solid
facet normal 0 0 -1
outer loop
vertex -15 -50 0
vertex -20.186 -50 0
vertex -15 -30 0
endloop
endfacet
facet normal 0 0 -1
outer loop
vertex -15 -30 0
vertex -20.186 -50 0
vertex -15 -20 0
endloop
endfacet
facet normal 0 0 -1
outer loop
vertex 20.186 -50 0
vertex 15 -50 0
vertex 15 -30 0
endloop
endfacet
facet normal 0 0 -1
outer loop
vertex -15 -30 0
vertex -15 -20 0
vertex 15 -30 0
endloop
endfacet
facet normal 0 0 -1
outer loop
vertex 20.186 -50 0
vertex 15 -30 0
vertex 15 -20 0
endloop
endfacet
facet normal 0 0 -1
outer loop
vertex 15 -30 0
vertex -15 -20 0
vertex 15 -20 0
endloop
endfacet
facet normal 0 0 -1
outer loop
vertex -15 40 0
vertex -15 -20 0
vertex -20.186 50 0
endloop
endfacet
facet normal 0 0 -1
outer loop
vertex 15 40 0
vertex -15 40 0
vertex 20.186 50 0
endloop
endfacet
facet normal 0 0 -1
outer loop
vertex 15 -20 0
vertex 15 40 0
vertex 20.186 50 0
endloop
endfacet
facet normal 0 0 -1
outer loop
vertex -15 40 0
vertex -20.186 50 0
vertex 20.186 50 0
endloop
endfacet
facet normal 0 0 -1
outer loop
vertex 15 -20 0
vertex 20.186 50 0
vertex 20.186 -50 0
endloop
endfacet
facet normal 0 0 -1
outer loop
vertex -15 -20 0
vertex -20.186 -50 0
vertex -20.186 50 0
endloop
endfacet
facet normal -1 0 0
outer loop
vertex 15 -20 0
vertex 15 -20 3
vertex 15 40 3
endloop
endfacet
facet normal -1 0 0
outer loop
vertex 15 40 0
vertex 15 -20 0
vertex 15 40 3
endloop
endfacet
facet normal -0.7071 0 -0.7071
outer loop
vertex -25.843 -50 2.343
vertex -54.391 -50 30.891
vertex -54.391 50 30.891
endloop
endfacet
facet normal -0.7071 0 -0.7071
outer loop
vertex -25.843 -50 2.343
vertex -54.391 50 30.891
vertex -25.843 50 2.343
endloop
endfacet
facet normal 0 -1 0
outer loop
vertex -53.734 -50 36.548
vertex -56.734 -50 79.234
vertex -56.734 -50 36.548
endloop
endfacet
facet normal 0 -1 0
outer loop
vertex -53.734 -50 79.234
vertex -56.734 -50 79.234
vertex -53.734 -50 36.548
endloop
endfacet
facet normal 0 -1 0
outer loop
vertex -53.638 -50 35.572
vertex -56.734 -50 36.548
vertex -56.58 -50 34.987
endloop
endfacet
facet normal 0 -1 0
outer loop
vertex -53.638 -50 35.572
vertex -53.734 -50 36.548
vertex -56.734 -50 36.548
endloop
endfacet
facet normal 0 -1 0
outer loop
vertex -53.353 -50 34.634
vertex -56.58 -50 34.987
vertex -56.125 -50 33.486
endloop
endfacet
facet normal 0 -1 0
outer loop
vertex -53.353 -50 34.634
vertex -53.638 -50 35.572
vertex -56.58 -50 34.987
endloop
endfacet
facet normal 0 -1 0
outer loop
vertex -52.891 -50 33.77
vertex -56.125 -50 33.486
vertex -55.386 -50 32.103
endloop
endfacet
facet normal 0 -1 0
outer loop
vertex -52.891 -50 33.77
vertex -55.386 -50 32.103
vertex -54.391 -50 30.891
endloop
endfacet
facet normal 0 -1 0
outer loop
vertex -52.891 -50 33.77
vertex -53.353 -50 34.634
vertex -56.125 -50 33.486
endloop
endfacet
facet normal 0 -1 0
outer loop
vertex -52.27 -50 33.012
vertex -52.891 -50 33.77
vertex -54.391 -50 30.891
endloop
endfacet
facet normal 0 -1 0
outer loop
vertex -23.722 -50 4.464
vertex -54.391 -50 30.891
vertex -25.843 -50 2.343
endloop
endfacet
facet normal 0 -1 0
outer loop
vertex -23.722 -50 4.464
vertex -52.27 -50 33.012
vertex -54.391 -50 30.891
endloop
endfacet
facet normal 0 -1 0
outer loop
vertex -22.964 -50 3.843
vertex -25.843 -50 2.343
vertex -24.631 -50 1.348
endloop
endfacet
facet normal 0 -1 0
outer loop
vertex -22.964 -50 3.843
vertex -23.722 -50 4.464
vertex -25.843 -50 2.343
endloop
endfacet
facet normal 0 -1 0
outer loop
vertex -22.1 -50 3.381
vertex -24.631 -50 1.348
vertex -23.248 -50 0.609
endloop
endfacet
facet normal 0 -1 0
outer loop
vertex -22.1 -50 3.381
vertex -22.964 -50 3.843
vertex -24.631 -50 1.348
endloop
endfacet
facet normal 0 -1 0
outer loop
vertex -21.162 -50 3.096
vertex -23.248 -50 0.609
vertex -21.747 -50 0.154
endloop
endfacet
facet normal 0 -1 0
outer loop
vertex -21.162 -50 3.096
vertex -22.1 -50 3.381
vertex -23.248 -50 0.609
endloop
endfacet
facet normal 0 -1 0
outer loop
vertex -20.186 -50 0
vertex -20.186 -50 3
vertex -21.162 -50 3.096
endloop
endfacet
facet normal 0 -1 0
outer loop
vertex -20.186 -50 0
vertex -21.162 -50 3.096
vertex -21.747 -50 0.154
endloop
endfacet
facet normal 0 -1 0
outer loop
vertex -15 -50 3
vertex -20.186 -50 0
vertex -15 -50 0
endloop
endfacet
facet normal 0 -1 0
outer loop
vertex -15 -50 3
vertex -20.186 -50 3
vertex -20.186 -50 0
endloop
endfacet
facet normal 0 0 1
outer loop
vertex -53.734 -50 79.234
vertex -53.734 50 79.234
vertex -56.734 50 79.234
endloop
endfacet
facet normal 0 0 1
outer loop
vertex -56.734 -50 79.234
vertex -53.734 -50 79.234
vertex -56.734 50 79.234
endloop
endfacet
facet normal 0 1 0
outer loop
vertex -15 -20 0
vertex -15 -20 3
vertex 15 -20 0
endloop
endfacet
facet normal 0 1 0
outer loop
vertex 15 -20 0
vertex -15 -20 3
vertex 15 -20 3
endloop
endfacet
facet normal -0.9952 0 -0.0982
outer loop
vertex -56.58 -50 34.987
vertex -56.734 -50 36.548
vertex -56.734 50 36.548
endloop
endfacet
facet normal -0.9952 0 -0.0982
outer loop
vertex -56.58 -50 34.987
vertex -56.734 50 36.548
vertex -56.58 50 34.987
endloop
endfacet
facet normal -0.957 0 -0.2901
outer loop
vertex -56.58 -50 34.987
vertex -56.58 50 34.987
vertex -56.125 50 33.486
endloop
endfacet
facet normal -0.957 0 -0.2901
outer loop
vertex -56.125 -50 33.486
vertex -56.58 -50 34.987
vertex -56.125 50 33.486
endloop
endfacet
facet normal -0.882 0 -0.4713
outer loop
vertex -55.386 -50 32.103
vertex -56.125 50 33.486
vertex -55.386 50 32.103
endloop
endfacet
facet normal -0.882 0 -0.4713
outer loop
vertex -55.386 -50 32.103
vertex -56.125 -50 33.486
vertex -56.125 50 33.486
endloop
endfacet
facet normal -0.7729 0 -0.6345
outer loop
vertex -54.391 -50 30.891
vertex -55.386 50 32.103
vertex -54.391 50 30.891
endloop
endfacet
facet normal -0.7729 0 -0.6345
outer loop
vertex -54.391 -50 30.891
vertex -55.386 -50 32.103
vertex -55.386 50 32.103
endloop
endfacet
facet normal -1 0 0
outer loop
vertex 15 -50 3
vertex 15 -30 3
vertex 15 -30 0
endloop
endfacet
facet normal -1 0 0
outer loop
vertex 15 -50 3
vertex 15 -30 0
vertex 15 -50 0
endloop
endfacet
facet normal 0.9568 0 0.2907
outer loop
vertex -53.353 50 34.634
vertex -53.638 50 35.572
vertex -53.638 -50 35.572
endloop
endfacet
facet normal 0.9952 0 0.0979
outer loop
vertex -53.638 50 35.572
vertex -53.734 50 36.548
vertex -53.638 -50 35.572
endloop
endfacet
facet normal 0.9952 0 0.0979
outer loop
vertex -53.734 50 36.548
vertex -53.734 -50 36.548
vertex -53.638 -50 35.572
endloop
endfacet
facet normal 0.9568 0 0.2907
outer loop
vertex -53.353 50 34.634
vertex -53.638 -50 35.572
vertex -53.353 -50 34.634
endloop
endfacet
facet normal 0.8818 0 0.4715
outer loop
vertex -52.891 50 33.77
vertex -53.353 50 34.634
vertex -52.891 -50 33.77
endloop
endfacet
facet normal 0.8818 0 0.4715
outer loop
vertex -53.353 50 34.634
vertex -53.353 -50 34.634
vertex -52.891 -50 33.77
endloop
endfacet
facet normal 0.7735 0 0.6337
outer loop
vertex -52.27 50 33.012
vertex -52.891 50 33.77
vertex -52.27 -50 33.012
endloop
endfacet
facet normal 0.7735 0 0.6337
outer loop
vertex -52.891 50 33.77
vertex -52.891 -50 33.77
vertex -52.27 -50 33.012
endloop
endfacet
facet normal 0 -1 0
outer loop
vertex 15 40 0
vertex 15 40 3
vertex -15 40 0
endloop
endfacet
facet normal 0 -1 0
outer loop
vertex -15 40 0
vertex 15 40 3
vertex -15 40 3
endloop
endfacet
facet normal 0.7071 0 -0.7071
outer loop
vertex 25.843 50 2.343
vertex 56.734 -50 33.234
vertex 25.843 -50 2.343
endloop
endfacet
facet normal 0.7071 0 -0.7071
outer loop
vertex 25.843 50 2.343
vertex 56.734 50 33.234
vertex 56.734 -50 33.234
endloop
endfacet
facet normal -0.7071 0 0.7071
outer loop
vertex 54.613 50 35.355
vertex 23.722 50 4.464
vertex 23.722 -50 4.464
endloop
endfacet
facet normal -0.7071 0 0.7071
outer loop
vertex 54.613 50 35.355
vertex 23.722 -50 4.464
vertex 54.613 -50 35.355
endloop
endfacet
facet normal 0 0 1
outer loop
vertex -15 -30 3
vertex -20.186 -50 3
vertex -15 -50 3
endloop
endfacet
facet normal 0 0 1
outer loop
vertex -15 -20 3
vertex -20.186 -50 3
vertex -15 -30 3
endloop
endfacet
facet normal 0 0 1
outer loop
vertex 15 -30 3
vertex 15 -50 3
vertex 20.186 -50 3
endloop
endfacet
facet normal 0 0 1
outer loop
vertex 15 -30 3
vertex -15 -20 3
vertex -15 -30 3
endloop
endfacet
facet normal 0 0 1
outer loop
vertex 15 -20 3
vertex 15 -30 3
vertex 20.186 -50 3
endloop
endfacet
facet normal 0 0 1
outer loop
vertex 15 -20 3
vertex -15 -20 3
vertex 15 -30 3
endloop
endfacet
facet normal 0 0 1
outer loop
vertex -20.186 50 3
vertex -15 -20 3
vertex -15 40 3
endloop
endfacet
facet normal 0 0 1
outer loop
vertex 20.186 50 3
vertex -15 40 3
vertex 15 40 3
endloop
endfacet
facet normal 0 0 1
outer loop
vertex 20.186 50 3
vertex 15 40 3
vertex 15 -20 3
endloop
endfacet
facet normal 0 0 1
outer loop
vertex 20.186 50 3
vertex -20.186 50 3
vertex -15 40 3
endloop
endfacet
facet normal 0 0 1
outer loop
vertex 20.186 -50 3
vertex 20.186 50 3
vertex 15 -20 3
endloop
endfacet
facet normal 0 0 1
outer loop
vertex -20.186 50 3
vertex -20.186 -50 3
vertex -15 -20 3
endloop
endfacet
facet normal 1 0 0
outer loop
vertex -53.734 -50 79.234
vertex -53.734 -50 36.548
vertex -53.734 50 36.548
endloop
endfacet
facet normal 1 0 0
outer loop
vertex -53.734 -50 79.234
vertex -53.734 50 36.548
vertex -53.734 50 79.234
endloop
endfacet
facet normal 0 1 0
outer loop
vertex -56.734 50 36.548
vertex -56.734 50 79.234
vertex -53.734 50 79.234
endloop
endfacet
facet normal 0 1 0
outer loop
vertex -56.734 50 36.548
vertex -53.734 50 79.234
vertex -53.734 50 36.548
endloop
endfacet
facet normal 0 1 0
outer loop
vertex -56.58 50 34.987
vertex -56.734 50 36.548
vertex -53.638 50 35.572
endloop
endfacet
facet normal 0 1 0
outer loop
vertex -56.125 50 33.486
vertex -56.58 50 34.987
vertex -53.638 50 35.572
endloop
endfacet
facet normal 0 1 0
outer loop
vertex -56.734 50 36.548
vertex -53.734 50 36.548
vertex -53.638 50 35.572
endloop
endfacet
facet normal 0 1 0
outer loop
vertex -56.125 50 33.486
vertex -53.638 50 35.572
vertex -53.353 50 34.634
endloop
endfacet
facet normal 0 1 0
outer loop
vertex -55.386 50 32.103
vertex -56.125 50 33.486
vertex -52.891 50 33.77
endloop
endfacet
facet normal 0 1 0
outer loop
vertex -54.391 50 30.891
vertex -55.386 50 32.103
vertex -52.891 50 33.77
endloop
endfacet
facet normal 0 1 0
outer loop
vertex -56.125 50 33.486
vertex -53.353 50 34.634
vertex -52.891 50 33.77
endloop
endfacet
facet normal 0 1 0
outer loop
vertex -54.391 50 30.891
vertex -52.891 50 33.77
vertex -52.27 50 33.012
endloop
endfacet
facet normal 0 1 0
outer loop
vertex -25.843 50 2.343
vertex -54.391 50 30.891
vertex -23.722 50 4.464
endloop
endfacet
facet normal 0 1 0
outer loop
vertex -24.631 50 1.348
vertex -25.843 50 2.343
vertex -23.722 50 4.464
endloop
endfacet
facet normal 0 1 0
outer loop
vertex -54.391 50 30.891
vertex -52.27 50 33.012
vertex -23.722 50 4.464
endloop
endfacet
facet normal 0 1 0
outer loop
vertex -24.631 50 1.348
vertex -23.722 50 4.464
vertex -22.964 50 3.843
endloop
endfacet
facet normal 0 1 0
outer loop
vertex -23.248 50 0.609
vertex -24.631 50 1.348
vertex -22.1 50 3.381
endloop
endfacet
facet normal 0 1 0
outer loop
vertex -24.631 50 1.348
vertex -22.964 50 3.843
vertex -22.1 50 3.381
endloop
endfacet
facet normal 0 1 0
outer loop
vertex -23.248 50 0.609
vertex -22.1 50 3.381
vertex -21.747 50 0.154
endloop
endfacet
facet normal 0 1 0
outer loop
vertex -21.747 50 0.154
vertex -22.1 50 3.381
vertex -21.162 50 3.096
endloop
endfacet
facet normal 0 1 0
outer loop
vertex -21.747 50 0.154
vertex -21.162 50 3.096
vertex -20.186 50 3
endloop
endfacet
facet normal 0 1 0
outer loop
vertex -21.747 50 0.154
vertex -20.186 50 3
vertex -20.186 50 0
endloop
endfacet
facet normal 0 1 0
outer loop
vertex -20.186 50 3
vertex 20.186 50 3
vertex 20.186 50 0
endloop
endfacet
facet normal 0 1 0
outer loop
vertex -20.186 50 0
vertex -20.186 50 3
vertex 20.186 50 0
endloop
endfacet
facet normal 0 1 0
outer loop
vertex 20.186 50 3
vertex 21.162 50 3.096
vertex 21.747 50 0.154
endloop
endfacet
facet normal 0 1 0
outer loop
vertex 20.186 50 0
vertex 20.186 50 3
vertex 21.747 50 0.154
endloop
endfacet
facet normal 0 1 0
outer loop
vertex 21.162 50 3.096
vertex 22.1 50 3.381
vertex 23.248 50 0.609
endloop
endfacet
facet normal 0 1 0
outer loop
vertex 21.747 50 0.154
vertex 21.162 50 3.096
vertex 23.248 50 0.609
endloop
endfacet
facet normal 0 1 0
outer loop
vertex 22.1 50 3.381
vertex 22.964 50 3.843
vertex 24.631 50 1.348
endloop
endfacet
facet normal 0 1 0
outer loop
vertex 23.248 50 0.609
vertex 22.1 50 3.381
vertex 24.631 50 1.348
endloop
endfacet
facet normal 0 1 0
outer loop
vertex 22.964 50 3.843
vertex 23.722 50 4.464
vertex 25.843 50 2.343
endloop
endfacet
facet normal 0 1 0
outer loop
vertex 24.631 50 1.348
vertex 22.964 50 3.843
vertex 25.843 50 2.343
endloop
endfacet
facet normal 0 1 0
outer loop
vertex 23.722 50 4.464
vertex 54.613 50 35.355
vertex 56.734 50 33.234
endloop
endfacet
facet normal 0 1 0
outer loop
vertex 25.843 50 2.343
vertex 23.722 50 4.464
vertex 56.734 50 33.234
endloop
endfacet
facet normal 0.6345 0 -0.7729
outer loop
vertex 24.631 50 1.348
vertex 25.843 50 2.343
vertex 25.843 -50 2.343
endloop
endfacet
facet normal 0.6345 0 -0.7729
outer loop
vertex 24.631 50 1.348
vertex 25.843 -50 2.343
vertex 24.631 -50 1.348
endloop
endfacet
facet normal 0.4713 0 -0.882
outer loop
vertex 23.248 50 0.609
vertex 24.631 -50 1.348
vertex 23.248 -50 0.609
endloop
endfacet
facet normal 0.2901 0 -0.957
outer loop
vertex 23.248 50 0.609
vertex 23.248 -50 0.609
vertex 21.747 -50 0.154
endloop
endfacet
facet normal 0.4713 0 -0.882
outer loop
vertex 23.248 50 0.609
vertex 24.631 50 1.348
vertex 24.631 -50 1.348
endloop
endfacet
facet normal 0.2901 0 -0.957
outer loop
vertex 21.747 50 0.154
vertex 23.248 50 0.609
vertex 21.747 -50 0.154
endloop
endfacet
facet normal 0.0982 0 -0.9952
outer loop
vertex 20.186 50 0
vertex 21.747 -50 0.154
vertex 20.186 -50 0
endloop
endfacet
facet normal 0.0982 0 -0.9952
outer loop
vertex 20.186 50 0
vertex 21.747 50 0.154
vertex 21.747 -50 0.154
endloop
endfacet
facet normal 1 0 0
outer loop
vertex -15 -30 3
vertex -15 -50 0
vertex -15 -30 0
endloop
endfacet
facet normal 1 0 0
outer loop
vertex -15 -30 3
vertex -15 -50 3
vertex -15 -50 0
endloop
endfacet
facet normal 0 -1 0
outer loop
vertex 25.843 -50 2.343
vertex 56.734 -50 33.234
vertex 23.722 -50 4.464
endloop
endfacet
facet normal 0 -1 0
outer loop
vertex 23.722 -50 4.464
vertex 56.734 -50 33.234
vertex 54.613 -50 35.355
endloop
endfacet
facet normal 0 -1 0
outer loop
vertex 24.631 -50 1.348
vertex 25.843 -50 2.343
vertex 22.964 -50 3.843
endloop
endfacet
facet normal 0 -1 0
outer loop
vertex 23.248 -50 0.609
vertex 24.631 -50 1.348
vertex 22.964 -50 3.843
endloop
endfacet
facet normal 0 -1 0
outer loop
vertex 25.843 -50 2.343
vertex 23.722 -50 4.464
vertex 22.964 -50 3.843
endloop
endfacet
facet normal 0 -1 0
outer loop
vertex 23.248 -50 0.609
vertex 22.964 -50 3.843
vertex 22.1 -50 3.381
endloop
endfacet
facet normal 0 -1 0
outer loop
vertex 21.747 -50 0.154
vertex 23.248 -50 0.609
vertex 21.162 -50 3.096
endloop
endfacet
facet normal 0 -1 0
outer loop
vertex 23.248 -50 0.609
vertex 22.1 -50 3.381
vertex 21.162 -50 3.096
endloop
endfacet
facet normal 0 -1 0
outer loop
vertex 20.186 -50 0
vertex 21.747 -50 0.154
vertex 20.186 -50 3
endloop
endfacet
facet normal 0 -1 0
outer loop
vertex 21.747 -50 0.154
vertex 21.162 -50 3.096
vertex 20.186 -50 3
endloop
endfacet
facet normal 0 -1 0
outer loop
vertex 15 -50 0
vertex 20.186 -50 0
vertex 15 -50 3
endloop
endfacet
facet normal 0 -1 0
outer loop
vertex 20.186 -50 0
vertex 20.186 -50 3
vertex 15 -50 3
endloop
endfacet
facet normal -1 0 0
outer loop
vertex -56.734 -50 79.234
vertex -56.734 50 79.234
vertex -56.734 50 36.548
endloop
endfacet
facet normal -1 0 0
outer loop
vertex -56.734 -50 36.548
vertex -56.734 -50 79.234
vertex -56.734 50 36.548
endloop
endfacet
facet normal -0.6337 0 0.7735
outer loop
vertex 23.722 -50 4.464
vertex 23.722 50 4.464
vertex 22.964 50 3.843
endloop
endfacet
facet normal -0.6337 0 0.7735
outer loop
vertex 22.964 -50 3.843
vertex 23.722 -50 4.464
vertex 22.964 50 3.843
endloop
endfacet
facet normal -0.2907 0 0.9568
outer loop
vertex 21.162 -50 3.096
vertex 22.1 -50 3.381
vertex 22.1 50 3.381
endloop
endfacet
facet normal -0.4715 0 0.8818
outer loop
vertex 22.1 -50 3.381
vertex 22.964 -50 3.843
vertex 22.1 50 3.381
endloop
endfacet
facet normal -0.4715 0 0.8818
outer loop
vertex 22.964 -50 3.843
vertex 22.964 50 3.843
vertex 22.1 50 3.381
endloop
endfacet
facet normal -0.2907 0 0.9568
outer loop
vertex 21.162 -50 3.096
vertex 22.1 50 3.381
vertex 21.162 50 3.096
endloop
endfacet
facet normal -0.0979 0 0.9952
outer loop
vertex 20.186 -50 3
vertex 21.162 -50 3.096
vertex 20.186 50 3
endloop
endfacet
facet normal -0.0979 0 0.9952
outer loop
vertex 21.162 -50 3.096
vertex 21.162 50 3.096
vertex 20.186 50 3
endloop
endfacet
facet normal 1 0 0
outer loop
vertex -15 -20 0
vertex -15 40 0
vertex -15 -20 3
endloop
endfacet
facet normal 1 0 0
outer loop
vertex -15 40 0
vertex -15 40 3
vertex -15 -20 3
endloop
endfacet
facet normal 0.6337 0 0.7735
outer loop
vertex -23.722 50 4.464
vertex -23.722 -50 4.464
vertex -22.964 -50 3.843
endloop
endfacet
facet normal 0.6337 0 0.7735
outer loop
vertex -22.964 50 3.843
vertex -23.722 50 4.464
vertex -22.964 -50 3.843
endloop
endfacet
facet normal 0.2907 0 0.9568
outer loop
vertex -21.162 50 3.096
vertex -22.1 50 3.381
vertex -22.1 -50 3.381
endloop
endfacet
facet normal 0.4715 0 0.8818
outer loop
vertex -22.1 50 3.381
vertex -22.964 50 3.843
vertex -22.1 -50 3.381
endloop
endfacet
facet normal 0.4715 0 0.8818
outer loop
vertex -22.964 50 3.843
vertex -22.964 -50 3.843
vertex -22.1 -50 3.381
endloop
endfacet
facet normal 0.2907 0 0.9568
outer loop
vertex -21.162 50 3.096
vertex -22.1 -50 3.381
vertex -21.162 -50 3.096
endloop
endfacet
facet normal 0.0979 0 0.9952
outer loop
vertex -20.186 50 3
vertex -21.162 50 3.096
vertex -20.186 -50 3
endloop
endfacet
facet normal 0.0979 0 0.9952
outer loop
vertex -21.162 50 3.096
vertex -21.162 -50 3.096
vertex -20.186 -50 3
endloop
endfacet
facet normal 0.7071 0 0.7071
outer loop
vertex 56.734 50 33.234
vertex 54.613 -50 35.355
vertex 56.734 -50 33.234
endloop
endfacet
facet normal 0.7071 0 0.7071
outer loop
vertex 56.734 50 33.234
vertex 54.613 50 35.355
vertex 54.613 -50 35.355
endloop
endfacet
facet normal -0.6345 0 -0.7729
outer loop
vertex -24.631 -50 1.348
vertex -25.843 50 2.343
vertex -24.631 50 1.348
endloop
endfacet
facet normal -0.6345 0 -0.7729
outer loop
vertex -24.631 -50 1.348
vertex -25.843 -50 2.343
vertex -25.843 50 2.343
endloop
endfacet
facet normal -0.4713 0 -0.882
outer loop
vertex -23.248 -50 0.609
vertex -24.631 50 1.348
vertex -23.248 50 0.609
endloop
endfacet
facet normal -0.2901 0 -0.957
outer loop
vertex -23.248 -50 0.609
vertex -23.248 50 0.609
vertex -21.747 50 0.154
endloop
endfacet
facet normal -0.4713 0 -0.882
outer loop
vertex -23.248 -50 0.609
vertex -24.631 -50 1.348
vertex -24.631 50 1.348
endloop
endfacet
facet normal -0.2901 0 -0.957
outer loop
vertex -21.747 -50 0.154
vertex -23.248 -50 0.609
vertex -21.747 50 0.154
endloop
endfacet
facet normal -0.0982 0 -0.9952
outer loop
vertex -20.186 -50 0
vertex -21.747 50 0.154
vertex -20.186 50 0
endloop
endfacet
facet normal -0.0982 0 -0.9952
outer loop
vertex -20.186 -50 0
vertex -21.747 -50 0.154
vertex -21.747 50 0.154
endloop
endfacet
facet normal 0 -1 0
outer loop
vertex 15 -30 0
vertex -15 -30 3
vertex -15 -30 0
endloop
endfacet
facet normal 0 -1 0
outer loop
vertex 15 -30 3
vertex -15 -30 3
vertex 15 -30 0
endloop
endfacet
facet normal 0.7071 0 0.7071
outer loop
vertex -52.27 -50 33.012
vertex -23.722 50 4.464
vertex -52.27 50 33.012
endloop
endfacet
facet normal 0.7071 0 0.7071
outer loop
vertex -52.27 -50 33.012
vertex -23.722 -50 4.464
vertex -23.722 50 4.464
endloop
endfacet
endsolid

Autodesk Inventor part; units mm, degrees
ref_plane "YZ Plane" through (0, 0, 0) normal (1, 0, 0) x (0, 1, 0)
ref_plane "XZ Plane" through (0, 0, 0) normal (0, 1, 0) x (-1, 0, 0)
ref_plane "XY Plane" through (0, 0, 0) normal (0, 0, 1) x (1, 0, 0)
sketch "Sketch1" plane through (0, 0, 0) normal (0, 0, 1) x (1, 0, 0)
  line L0 (-23.5, -50) -> (23.5, -50)
  line L1 (23.5, -50) -> (23.5, 50)
  line L2 (23.5, 50) -> (-23.5, 50)
  line L3 (-23.5, 50) -> (-23.5, -50)
  line L4 (-23.5, -50) -> (23.5, 50) construction
  line L5 (23.5, -50) -> (-23.5, 50) construction
  point P0 (0, 0)
  dimension "d154" = 47
  dimension "d155" = 100
extrude "Plate3" add sketch "Sketch1" along normal blind 3
sketch "Sketch7" plane through (21.3787, 50, 2.1213) normal (0.7071068, 0, -0.7071068) x (0, 1, 0)
  line L0 (-100, 0) -> (0, 0)
  line L1 (0, 0) -> (0, 47)
  line L2 (0, 47) -> (-100, 47)
  line L3 (-100, 47) -> (-100, 0)
edge flange "Flange3" height 47 angle 45 thickness 3 bend radius 5 thickness toward (0.7071068, 0, -0.7071068) relief round relief width 3 relief depth 1.5 corner gap 5 corner form 0 edges at (23.5, 0, 3) (-23.5, 0, 3) wall of the first edge with corners at (21.3787, -50, 2.1213) (21.3787, 50, 2.1213) (54.6127, 50, 35.3553) (54.6127, -50, 35.3553)
bend "Bend3"
corner "Corner3"
sketch "Sketch8" plane through (0, 0, 3) normal (0, 0, 1) x (1, 0, 0)
  line L0 (15, 40) -> (-15, 40)
  line L1 (-15, 40) -> (-15, -20)
  line L2 (-15, -20) -> (15, -20)
  line L3 (15, -20) -> (15, 40)
  line L4 (15, 40) -> (-15, -20) construction
  line L5 (-15, 40) -> (15, -20) construction
  line L6 (-23.5, 50) -> (20.1863, 50) projected
  line L7 (-20.1863, -50) -> (20.1863, -50) projected
  line L8 (15, -50) -> (-15, -50)
  line L9 (-15, -50) -> (-15, -30)
  line L10 (-15, -30) -> (15, -30)
  line L11 (15, -30) -> (15, -50)
  point P0 (0, 0)
  point P1 (0, 10)
  point P2 (-15, -50)
  dimension "d166" = 30
  dimension "d168" = 10
  dimension "d182" = 10
  dimension "d183" = 20
extrude "Cut1" cut sketch "Sketch8" against normal blind 3
sketch "Sketch9" plane through (-53.734, -50, 33.234) normal (-1, 0, 0) x (0, -1, 0)
  line L0 (-100, 0) -> (0, 0)
  line L1 (0, 0) -> (0, 46)
  line L2 (0, 46) -> (-100, 46)
  line L3 (-100, 46) -> (-100, 0)
edge flange "Flange4" height 46 angle 45 thickness 3 bend radius 5 thickness toward (-1, 0, 0) relief round relief width 3 relief depth 1.5 edges at (-54.6127, 0, 35.3553) wall of the first edge with corners at (-53.734, 50, 33.234) (-53.734, -50, 33.234) (-53.734, -50, 79.234) (-53.734, 50, 79.234)
bend "Bend4"
corner "Corner4"
properties part number "DS-B-101 Axis" material "Stainless Steel"
